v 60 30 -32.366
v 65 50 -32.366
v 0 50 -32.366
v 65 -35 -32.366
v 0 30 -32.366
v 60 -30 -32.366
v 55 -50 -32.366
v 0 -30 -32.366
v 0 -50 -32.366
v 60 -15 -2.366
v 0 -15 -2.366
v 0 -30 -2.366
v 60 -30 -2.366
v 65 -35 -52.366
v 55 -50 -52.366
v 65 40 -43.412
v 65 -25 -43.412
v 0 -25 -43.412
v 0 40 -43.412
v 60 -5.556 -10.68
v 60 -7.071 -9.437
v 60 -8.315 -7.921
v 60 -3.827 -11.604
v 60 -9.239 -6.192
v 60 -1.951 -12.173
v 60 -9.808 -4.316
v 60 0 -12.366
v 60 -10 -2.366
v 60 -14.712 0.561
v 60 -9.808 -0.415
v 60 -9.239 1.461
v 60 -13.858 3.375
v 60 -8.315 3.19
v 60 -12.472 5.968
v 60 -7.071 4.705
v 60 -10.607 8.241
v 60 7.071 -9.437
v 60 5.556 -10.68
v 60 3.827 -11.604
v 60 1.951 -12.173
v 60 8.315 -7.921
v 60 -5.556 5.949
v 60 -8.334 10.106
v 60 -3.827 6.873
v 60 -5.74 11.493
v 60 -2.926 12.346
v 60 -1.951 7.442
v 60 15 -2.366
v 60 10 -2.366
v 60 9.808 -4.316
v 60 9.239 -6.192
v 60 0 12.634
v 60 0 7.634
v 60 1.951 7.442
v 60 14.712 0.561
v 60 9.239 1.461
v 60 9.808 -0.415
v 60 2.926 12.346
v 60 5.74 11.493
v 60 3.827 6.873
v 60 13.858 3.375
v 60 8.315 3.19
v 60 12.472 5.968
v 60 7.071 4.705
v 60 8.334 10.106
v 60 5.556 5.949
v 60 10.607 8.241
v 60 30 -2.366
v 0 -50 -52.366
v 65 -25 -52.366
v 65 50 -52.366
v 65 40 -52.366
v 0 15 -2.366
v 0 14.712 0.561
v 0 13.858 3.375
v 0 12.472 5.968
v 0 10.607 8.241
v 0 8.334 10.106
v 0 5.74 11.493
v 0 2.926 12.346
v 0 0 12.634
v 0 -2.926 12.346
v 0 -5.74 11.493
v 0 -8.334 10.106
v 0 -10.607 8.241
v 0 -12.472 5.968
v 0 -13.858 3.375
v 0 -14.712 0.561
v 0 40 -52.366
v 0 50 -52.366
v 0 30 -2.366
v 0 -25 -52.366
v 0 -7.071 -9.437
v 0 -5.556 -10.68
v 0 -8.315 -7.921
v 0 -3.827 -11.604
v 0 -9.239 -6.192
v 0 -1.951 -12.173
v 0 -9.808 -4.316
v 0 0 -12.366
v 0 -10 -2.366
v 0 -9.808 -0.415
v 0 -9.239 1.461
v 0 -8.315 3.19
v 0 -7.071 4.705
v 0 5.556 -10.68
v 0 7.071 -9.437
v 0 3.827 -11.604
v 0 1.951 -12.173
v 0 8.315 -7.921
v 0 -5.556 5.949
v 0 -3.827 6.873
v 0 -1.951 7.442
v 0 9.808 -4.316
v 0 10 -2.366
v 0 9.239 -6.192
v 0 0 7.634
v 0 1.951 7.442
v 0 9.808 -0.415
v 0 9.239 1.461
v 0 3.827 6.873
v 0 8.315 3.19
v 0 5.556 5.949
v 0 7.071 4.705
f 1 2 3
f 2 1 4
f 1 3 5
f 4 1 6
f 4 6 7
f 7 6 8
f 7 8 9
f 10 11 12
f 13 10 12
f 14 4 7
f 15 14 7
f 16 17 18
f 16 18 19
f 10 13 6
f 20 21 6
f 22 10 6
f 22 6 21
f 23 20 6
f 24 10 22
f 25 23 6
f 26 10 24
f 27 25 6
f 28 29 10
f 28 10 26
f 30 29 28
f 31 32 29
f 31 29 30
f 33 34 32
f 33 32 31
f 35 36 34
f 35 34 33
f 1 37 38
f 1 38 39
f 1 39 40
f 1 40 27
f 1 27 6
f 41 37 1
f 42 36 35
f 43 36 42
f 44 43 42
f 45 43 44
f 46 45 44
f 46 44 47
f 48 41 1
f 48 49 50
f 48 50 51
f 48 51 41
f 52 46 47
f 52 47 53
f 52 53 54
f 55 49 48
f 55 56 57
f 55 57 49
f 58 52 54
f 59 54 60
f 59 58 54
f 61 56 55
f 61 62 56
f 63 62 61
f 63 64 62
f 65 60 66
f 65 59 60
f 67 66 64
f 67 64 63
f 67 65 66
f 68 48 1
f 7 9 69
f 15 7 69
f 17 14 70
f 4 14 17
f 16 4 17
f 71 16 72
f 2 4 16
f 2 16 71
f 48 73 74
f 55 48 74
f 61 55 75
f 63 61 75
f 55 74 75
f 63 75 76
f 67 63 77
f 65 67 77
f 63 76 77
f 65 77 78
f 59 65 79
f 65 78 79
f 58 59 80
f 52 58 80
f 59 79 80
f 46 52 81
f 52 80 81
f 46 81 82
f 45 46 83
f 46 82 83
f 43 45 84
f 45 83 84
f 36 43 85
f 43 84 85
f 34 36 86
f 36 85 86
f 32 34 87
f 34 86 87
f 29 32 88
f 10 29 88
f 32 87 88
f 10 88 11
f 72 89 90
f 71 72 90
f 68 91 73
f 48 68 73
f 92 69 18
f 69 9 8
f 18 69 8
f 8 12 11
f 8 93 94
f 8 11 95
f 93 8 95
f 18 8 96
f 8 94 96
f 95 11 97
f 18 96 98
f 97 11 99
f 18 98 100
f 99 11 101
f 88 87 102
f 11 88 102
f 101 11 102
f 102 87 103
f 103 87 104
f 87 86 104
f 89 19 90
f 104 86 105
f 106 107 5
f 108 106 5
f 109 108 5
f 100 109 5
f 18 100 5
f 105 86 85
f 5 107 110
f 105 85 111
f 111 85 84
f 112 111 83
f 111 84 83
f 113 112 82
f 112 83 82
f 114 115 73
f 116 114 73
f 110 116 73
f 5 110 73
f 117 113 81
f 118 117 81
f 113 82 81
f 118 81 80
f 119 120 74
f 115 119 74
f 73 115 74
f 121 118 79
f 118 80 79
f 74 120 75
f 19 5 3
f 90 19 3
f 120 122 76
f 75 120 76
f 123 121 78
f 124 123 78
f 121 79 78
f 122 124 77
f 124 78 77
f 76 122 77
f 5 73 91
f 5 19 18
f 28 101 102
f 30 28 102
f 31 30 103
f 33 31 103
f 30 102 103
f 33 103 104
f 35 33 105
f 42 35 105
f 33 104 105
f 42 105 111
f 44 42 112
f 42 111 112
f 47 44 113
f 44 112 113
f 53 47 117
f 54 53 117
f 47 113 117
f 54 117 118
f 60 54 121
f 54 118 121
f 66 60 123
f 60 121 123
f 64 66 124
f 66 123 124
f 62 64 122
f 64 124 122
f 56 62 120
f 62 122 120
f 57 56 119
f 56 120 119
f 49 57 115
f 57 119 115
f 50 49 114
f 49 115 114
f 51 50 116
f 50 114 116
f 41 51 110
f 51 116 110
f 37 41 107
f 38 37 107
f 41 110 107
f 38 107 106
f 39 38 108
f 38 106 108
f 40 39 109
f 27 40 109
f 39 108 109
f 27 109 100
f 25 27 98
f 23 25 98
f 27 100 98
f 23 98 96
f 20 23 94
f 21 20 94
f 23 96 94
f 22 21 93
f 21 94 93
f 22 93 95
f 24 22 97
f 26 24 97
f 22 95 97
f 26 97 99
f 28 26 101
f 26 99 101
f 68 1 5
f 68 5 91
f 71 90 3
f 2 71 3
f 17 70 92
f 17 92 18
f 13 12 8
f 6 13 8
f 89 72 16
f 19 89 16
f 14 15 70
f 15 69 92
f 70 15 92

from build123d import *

# Parameters (mm, degrees)
F1_DEPTH = 65
F0_W     = 65
F0_H     = 8.9540635944
F2_DEPTH = 60
F3_W     = 65
F3_H     = 8.9540635944
F4_DEPTH = 100
F6_DEPTH = 25


with BuildPart() as f1:
    # F0 (on Right) → F1 (new body)
    with BuildSketch(Plane.YZ):
        Polygon((-30, -32.3655755222), (-50, -32.3655755222), (-50, -52.3655755222), (-25, -52.3655755222), (-25, -43.4115119278), (40, -43.4115119278), (40, -52.3655755222), (50, -52.3655755222), (50, -32.3655755222), (30, -32.3655755222), align=None)
    extrude(amount=F1_DEPTH)

    # F0 (on Right) → F2 (join)
    with BuildSketch(Plane.YZ):
        Polygon((-30, -32.3655755222), (-50, -32.3655755222), (-50, -52.3655755222), (-25, -52.3655755222), (-25, -43.4115119278), (40, -43.4115119278), (40, -52.3655755222), (50, -52.3655755222), (50, -32.3655755222), (30, -32.3655755222), align=None)
        with BuildLine():
            Line((-30, -2.3655755222), (-30, -32.3655755222))
            Line((-30, -32.3655755222), (30, -32.3655755222))
            Line((30, -32.3655755222), (30, -2.3655755222))
            Line((30, -2.3655755222), (15, -2.3655755222))
            ThreePointArc((15, -2.3655755222), (0, -17.3655755222), (-15, -2.3655755222))
            Line((-15, -2.3655755222), (-30, -2.3655755222))
        make_face()
        with Locations((7.5, -47.888543725)):
            Rectangle(F0_W, F0_H)
        with BuildLine():
            ThreePointArc((15, -2.3655755222), (0, 12.6344244778), (-15, -2.3655755222))
            Line((-15, -2.3655755222), (-10, -2.3655755222))
            ThreePointArc((-10, -2.3655755222), (0, 7.6344244778), (10, -2.3655755222))
            Line((10, -2.3655755222), (15, -2.3655755222))
        make_face()
        with BuildLine():
            Line((-10, -2.3655755222), (-15, -2.3655755222))
            ThreePointArc((-15, -2.3655755222), (0, -17.3655755222), (15, -2.3655755222))
            Line((15, -2.3655755222), (10, -2.3655755222))
            ThreePointArc((10, -2.3655755222), (0, -12.3655755222), (-10, -2.3655755222))
        make_face()
    extrude(amount=F2_DEPTH)

    # F3 (on face) → F4 (cut)
    with BuildSketch(Plane.YZ.offset(60)):
        with Locations((7.5, -47.888543725)):
            Rectangle(F3_W, F3_H)
    extrude(amount=-F4_DEPTH, mode=Mode.SUBTRACT)

    # F5 (on face) → F6 (cut)
    with BuildSketch(Plane.XY.offset(-32.3655755222)):
        Polygon((65, -35), (55, -50), (65, -50), align=None)
    extrude(amount=-F6_DEPTH, mode=Mode.SUBTRACT)


solid = f1.part
